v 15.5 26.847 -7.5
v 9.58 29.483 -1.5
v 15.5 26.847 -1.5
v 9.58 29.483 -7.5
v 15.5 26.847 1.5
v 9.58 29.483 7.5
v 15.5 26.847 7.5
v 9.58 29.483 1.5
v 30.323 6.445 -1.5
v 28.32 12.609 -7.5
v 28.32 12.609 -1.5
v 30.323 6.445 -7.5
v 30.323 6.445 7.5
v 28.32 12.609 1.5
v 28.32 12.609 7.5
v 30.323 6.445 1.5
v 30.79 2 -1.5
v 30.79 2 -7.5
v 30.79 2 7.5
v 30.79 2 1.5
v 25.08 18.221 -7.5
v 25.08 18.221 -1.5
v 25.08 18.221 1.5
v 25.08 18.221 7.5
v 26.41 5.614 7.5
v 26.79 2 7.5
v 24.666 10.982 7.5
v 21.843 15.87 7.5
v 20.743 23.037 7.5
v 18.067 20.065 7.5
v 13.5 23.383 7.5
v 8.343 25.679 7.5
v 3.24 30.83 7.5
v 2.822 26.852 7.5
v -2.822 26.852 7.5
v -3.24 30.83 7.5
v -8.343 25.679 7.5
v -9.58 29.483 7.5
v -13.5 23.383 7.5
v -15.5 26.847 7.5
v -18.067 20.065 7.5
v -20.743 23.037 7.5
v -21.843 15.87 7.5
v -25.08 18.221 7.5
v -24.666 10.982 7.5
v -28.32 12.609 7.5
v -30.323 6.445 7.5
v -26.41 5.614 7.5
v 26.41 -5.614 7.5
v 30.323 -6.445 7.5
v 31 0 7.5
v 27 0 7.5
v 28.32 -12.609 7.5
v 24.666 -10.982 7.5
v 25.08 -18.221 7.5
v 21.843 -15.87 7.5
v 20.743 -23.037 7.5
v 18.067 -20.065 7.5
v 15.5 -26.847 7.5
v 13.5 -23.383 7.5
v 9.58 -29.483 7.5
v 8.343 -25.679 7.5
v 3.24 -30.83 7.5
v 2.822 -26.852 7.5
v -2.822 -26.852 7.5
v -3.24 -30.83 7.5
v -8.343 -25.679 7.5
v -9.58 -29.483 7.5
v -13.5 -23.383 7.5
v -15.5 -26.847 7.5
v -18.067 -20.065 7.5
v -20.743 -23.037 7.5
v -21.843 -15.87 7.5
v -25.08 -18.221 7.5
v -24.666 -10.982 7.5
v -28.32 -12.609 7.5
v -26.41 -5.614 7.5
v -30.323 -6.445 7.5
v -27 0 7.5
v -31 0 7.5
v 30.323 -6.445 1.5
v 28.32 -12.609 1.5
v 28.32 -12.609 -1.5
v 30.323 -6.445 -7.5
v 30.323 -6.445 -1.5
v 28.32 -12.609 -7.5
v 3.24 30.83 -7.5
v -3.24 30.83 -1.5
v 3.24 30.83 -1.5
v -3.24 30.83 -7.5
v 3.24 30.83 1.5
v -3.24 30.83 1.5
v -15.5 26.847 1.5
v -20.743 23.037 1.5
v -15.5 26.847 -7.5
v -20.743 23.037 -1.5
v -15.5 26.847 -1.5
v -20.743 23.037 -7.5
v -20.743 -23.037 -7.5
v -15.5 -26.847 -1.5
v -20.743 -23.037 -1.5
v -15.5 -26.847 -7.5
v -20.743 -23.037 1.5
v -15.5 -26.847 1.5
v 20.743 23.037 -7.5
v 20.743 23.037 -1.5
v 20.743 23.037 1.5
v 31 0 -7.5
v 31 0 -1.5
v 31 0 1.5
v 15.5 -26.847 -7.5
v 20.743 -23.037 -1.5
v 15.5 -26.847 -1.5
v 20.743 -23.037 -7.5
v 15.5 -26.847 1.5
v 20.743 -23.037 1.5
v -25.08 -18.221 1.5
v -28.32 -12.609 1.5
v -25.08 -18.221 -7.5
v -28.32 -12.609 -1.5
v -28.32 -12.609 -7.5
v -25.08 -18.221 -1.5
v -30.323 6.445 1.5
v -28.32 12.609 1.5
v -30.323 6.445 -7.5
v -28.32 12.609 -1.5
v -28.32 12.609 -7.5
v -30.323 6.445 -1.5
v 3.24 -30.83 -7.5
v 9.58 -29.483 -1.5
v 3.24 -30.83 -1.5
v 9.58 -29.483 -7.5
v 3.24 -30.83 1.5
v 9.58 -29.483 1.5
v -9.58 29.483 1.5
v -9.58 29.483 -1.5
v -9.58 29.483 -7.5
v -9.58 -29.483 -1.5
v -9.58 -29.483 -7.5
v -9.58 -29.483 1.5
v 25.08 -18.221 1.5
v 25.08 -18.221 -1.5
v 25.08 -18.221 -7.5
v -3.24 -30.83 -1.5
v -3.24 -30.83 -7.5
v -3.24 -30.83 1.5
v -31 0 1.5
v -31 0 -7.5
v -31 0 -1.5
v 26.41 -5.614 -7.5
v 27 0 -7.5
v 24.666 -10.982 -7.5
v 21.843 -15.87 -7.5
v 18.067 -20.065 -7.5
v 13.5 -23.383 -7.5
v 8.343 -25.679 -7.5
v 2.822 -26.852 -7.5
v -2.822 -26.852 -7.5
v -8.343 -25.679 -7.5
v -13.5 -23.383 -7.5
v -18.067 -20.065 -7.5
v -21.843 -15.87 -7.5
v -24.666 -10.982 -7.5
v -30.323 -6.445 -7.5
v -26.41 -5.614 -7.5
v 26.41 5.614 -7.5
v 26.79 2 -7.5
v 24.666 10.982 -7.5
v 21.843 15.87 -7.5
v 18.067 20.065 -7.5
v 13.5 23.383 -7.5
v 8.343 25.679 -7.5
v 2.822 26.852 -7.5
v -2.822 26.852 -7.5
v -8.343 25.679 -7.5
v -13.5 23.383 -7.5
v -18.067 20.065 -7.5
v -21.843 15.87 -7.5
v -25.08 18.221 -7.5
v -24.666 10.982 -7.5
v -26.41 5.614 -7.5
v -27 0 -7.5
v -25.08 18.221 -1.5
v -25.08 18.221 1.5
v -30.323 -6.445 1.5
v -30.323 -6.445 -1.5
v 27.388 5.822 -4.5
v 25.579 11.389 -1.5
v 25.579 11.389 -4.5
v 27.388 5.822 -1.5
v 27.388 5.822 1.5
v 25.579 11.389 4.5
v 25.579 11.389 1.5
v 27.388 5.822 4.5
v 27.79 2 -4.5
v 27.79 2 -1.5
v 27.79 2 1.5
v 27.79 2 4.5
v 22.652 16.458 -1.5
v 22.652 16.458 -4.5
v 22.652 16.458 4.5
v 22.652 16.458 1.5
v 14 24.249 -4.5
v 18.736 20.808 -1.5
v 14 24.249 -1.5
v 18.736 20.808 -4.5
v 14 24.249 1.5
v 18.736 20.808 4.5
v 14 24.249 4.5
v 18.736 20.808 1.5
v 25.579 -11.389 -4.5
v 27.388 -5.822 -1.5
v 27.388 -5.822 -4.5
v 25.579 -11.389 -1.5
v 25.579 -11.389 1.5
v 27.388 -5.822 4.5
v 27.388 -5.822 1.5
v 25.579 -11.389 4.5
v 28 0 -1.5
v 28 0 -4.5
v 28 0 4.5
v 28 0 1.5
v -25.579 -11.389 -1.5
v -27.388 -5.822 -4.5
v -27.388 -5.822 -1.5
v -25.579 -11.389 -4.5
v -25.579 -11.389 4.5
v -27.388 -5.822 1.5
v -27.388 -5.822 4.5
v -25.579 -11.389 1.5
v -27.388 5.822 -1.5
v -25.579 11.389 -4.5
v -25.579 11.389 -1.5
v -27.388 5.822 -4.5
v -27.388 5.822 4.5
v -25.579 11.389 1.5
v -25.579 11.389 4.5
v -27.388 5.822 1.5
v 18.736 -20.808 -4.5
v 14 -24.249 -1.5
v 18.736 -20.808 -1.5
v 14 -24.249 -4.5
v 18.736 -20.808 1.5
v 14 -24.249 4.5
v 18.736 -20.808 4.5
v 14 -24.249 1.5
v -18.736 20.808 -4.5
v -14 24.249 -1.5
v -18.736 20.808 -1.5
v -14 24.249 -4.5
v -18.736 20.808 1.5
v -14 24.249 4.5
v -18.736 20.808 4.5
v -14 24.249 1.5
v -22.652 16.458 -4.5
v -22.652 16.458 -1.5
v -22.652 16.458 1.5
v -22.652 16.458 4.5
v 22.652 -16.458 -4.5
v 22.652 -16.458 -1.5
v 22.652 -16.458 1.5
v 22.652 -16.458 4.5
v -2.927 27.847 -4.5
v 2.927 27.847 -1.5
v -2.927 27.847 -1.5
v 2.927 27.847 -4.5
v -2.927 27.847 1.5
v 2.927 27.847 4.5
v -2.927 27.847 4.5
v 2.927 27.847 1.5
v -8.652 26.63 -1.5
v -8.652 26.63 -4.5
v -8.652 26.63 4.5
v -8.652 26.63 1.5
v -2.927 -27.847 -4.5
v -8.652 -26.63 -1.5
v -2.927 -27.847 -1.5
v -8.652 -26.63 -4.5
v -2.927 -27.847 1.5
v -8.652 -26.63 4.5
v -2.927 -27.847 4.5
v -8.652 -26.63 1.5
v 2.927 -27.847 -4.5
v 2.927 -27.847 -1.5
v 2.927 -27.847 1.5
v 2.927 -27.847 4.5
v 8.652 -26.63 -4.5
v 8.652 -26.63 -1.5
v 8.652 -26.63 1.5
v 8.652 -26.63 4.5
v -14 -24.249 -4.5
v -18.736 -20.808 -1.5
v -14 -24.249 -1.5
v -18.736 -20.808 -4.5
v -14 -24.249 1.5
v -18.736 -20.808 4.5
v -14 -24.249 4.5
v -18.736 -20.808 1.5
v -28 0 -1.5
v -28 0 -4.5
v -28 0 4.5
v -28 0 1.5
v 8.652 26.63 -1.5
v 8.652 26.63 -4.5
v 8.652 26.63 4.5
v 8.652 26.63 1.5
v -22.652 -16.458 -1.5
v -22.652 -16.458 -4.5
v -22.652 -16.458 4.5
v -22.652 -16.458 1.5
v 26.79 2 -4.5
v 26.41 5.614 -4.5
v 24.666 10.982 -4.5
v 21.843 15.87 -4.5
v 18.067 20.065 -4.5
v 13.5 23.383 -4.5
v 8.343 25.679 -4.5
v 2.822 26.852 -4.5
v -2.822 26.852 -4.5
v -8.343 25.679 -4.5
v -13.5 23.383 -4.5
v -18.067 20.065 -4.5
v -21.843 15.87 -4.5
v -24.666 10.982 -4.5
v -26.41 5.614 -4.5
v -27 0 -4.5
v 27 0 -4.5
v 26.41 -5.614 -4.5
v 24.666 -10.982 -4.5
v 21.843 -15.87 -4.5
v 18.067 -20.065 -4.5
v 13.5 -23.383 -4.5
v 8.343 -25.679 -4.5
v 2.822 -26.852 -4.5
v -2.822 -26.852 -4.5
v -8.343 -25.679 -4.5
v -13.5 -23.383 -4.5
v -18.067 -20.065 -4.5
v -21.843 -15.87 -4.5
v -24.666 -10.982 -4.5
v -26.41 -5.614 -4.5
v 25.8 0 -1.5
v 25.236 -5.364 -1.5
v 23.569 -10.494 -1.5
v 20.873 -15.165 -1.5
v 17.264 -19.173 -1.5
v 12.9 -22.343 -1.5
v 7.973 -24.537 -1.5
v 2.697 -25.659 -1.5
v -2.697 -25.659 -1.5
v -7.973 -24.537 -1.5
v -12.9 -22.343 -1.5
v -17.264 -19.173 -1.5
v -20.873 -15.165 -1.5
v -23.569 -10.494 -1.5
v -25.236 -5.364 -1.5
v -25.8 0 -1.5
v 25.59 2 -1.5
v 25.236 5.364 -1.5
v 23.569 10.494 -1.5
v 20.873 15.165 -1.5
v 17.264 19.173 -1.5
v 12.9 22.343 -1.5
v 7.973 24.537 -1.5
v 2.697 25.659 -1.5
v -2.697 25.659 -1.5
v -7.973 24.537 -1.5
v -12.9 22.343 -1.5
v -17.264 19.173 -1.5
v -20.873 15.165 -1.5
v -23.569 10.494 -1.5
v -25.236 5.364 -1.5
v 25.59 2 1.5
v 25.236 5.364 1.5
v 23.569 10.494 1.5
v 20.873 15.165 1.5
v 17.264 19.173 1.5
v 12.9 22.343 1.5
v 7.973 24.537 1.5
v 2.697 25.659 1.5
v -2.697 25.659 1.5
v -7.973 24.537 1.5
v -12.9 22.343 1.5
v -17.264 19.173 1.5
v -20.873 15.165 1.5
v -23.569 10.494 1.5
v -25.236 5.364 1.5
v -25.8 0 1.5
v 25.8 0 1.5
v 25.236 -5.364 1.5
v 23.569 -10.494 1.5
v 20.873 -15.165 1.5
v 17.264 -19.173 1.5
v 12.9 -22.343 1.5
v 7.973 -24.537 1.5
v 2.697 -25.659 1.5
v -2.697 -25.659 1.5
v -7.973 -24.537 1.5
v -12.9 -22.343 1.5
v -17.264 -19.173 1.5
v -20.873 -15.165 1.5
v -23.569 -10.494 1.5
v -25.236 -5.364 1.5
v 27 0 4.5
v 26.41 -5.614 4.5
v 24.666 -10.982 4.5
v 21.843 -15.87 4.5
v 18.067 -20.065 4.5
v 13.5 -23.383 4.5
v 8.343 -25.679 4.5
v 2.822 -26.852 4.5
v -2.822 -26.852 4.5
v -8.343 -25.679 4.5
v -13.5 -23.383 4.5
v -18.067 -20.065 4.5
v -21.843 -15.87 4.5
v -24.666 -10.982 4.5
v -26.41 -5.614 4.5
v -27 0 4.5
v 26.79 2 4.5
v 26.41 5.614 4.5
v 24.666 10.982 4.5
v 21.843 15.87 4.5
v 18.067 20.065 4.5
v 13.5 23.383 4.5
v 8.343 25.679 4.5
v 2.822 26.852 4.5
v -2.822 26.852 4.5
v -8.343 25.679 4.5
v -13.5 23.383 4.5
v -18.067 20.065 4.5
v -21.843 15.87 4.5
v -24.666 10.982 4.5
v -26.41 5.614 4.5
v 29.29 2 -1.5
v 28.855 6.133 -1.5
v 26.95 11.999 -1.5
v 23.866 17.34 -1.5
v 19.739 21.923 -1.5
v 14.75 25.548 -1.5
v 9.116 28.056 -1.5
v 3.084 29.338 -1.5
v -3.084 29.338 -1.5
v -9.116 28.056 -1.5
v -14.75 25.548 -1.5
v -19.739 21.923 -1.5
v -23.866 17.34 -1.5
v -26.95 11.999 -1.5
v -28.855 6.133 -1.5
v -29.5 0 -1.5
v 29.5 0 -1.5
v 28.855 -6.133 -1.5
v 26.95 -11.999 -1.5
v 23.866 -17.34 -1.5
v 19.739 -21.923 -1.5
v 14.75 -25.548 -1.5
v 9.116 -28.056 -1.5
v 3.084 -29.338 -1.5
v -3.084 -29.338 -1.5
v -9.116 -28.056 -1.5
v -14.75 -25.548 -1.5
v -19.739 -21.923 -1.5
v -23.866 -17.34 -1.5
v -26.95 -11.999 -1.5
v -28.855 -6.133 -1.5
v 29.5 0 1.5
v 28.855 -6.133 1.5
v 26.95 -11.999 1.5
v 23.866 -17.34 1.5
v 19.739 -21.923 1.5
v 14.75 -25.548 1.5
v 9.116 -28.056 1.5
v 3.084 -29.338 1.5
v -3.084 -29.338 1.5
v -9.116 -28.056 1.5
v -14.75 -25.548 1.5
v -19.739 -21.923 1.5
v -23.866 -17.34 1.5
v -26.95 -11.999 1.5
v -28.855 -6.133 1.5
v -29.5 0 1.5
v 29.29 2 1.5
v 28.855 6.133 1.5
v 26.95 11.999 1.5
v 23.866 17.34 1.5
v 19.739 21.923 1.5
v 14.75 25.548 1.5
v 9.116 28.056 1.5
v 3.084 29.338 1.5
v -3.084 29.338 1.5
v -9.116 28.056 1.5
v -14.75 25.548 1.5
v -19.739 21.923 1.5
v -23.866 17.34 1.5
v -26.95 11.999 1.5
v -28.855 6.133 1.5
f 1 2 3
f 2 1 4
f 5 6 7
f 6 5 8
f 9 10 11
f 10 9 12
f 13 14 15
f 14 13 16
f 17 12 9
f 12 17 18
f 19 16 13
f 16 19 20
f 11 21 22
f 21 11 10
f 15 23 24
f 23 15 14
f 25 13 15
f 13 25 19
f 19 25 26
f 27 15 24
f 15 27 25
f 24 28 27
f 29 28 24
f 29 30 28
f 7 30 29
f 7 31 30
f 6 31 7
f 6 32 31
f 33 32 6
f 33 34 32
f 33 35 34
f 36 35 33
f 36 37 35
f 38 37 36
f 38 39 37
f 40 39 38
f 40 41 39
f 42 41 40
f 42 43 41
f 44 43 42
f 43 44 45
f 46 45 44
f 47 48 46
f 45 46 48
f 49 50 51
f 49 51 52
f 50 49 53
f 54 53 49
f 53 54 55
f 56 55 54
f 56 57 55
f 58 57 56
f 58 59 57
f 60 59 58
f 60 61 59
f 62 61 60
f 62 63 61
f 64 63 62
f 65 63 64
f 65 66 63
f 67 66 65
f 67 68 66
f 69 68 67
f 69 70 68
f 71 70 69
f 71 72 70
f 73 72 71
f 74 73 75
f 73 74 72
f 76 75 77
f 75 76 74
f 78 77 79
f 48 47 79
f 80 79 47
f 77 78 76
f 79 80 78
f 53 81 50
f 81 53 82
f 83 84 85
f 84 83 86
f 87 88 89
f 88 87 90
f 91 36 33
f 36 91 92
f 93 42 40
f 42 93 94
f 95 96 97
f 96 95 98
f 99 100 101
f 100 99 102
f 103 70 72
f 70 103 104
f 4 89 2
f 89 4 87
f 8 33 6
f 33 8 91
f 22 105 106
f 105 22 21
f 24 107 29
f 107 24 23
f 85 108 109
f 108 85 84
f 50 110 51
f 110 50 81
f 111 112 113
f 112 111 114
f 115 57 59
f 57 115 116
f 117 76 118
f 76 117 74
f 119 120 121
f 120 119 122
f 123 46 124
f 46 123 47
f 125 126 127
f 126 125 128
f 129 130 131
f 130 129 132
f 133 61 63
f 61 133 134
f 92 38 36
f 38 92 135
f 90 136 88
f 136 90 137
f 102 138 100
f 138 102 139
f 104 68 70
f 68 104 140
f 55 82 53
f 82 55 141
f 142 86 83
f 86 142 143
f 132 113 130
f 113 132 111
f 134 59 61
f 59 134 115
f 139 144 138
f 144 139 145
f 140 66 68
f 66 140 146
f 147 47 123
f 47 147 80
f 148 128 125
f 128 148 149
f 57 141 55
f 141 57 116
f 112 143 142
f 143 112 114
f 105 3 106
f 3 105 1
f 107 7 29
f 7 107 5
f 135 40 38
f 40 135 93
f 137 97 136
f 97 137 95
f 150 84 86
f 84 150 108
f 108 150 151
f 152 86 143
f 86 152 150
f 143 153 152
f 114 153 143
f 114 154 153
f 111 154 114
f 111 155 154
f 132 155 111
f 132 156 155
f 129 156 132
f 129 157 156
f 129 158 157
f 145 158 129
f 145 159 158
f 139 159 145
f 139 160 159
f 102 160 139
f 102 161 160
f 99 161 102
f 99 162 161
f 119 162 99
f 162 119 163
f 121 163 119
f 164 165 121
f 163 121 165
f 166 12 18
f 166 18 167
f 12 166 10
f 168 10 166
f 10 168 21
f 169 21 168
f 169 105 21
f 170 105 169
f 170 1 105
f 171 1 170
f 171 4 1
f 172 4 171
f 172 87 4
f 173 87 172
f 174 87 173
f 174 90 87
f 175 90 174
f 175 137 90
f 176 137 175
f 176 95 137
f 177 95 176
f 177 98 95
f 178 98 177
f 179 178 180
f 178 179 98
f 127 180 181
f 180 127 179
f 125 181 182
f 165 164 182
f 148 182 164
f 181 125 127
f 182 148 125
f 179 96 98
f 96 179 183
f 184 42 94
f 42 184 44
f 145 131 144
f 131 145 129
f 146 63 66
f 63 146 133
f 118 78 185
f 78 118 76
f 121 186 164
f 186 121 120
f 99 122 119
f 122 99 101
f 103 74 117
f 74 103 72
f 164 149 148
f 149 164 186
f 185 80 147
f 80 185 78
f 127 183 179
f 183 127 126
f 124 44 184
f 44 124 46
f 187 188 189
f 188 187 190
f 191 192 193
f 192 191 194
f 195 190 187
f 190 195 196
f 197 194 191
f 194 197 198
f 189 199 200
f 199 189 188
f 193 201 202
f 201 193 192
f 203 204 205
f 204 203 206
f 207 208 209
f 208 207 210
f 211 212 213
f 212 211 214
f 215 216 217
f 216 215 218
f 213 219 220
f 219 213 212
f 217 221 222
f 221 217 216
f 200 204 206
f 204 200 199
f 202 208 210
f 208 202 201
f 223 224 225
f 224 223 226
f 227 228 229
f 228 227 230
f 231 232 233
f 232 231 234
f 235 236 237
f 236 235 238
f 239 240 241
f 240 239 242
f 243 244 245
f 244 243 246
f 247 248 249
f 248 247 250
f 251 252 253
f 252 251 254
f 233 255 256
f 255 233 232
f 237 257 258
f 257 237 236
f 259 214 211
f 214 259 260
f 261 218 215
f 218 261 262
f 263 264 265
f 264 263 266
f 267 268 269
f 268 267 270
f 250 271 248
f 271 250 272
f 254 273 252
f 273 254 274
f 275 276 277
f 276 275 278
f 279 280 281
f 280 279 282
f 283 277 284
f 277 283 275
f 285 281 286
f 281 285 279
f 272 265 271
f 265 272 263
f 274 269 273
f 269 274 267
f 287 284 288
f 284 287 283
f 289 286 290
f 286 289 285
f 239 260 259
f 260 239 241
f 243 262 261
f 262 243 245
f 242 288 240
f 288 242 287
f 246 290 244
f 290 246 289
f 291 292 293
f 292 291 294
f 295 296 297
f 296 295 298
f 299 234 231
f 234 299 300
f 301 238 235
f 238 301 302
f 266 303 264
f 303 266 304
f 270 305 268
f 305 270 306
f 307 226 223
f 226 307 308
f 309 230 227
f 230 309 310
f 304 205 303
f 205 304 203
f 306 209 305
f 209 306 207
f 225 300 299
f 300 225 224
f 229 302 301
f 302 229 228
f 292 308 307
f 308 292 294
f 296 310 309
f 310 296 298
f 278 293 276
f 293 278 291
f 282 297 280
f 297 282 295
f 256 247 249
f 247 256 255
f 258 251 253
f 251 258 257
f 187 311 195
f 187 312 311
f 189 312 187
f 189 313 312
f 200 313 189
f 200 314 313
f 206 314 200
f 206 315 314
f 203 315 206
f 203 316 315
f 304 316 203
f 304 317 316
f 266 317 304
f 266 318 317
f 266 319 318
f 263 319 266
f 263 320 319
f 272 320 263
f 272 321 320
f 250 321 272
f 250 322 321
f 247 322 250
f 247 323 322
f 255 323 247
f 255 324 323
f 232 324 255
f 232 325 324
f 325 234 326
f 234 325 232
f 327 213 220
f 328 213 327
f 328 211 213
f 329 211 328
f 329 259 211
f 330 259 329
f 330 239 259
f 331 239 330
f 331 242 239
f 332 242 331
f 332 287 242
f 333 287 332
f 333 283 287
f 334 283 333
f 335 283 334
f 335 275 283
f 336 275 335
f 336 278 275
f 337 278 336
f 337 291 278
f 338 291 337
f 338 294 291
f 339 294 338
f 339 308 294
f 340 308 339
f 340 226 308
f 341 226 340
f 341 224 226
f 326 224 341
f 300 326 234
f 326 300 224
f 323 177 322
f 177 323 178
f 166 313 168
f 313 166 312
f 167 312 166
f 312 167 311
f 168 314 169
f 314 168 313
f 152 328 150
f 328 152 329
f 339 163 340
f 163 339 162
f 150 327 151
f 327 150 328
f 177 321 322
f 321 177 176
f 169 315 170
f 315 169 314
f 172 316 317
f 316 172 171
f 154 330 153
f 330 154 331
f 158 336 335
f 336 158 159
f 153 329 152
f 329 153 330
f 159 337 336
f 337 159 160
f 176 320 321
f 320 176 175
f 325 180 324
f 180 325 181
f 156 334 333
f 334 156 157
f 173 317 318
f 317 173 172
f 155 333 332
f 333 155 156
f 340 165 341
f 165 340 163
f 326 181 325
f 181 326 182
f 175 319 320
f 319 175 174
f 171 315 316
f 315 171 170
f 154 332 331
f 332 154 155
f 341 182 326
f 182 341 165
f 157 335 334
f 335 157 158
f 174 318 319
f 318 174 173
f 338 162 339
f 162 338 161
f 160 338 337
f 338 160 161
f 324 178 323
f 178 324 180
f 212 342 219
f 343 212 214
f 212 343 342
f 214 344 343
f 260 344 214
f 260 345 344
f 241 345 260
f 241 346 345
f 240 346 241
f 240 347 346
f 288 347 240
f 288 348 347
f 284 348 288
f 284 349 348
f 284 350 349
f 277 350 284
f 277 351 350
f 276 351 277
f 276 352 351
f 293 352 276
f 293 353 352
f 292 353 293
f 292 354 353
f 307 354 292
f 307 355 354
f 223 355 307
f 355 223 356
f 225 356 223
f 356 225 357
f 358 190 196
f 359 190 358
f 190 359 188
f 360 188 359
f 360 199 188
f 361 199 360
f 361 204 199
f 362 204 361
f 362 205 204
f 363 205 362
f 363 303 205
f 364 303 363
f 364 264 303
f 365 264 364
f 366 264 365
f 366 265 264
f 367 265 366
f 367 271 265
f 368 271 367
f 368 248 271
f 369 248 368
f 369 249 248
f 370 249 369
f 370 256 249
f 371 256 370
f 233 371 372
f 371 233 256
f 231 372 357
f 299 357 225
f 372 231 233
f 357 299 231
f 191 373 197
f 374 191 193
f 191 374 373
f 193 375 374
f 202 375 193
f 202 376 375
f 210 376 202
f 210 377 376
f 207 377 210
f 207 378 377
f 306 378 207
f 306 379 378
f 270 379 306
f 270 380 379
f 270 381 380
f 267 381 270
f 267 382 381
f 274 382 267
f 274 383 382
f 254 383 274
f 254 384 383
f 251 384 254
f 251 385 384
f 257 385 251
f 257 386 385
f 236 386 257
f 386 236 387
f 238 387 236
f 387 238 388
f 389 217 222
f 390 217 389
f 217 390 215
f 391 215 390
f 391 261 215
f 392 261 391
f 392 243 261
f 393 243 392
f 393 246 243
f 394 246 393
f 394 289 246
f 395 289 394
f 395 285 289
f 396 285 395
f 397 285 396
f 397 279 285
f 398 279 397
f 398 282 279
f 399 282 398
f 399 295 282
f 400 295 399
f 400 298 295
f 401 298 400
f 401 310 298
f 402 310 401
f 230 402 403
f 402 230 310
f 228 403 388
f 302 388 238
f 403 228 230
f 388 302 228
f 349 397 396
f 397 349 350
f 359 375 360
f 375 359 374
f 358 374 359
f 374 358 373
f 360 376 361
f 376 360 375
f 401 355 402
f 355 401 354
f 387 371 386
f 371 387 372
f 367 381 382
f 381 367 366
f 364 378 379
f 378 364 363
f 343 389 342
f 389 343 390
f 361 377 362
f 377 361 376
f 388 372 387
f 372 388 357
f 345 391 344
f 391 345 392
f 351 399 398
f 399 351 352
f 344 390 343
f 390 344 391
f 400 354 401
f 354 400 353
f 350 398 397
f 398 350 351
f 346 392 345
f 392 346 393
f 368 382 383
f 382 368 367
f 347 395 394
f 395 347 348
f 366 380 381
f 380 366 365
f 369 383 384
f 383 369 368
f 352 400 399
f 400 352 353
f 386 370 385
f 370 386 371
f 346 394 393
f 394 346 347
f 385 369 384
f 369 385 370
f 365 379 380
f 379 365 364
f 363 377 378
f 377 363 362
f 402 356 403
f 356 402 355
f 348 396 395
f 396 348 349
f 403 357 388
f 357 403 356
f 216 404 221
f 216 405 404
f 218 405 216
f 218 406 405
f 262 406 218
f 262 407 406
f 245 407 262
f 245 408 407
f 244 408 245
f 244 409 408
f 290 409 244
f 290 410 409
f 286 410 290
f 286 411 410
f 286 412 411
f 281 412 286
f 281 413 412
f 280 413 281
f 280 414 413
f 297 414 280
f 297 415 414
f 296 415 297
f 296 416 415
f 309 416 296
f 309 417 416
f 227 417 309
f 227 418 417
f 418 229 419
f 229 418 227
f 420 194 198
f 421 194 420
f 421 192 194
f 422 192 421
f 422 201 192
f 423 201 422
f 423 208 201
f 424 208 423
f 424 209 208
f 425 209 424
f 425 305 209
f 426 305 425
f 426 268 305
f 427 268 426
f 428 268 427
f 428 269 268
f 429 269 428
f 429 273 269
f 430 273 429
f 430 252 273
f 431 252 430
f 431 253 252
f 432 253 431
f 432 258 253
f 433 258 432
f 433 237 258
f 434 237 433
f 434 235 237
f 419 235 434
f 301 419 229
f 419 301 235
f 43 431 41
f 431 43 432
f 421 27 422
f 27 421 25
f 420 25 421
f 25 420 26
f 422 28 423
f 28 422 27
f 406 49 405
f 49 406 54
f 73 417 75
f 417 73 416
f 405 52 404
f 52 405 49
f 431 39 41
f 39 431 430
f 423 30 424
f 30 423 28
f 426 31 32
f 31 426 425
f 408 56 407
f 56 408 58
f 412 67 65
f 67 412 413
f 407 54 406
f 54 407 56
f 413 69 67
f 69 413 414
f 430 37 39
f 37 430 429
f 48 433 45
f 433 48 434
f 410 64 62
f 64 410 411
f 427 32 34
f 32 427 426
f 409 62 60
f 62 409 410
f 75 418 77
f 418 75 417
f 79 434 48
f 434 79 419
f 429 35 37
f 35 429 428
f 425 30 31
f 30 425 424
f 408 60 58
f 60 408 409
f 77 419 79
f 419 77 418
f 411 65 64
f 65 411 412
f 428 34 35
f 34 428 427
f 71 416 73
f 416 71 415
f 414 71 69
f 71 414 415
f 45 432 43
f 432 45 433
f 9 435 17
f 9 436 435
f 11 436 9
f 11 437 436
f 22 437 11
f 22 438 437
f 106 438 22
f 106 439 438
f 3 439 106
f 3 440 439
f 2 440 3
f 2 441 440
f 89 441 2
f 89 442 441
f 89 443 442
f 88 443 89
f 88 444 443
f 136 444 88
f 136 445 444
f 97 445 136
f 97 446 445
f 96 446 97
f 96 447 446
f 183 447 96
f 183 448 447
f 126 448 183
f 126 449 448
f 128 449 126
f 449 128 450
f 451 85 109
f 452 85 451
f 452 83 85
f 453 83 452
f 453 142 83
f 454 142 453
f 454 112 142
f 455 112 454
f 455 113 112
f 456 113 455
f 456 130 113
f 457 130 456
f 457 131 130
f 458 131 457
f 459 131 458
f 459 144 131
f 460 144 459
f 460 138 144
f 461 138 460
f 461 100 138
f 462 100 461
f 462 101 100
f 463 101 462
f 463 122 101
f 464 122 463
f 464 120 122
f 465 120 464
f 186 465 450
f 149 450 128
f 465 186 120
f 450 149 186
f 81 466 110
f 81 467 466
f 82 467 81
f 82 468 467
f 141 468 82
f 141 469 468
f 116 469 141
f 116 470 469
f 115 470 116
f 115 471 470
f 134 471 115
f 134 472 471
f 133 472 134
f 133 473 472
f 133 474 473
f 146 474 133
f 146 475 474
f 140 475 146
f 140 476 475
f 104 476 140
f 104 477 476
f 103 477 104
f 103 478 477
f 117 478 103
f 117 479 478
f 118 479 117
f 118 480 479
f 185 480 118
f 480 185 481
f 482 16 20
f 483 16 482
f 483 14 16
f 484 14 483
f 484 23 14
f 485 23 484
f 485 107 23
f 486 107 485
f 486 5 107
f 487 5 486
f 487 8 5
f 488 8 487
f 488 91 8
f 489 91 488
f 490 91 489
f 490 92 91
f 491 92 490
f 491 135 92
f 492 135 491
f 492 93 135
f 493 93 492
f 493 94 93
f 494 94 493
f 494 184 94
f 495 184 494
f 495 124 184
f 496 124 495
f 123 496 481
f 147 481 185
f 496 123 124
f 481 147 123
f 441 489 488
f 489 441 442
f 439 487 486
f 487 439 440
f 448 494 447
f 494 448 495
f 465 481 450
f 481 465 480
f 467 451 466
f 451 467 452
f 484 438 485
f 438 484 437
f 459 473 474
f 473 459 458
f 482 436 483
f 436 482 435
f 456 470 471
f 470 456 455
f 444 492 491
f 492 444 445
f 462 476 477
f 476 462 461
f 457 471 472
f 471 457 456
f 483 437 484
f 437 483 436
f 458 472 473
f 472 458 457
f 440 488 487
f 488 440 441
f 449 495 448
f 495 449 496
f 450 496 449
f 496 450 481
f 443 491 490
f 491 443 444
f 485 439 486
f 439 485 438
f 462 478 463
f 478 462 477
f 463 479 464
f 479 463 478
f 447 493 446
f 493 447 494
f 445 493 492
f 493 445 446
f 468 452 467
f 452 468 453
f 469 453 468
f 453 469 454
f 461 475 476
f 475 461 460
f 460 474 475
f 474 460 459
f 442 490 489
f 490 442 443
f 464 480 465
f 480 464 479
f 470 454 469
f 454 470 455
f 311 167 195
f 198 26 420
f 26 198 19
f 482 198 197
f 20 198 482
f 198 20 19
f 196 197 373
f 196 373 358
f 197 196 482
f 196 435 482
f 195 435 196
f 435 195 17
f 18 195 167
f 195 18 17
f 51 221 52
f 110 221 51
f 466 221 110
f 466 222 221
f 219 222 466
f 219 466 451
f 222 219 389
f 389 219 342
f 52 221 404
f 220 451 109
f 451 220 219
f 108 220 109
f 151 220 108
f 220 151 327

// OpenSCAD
main_diameter = 54;
tube_thickness = 1.2;
tube_length = 97;

ladder_rungs_thickess = 2;
ladder_rungs_count = 4;
vent_hole_diameter = 3;
vent_holes_per_ring = 3;


fit_diameter1 = 56;
fit_l1 = 3;
fit_l2 = 3;
fit_diameter3 = 60;
fit_l3 = 3;

connector_d=62;
connector_delta_d=59;
connector_delta=3;
connector_cut_th=2;

eps = 0.01;

home_diameter_1 = 110;
home_diameter_2 = 65;


module tube(do, di, th, l) {
    let(ddi=(di == undef) ? (do - th*2) : di){
        difference() {
            cylinder(h=l, d=do);
            translate([0, 0, -eps]) {
                cylinder(h=l + eps*2, d=ddi);
            };
        };
    };

}


module ladder_rung() {
    rotate_extrude(angle = 360, convexity = 200) {
        translate([
            -main_diameter/2 + ladder_rungs_thickess - (0.5 * eps * cos(30)), 0, 0]) {
            //rotate(a=90, [1, 0, 0]){
                circle(d=ladder_rungs_thickess+eps, $fn=3);
            //}
        }
    }
};

module fitting() {
    tube(do=fit_diameter1, di=main_diameter-eps, l=fit_l1);
    translate([0,0,fit_l1 + fit_l2]) {
        tube(do=fit_diameter3, di=main_diameter-eps, l=fit_l3);
    }
};

module hamster_tube() {
    difference() {
        tube(do=main_diameter, th=tube_thickness, l=tube_length, $fn=200);
        let (step_size = tube_length / (ladder_rungs_count)) {
            for(j=[0: vent_holes_per_ring]) {
                rotate(360/vent_holes_per_ring*j, [0,0,1]) {
                    for (i = [0:(ladder_rungs_count-1)]) {
                        let(z = step_size * i) {
                            echo("z: ", z);
                            translate([0,0,z]) {
                                rotate(90, [0,1,0]) {
                                    cylinder(d=vent_hole_diameter, h=main_diameter/2+eps);
                                }
                            }
                            
                        }
                    }
                }
            }
        }
    };

    let (step_size = tube_length / (ladder_rungs_count)) {
        echo("Delta: ", step_size);
        for (i = [0:(ladder_rungs_count-1)]) {
            let(z = step_size * i + step_size*0.5) {
                echo("z: ", z);
                translate([0, 0, z]) {
                    ladder_rung();
                }
            }
        }
    };
    
    fitting();
    
    translate([0,0,tube_length]) {
        mirror([0,0,1]) {
            fitting();
        }
    }
};

module hamster_home() {
    difference() {
        union() {
            scale([1,1,home_diameter_2/home_diameter_1]) {
                sphere(d=home_diameter_1, $fn=100);
            };
            
            for(i=[0,1]) {
                rotate(90*i, [0,0,1]) {
                    rotate(90, [0,1,0]) {
                        cylinder(d=main_diameter, h=home_diameter_1/2, $fn=100);
                        translate([0,0, home_diameter_1/2]) {
                            mirror([0,0,1]) {
                                fitting($fn=200);
                            }
                        }
                    };
                };
            }
        };
        union() {
            scale([1,1,(home_diameter_2-tube_thickness*2)/(home_diameter_1-tube_thickness*2)]) {
                sphere(d=home_diameter_1-tube_thickness*2, $fn=100);
            };
            
            for(i=[0,1]) {
                rotate(90*i, [0,0,1]) {
                    rotate(90, [0,1,0]) {
                        cylinder(d=main_diameter-tube_thickness*2, h=home_diameter_1/2+eps, $fn=200);
             
                    };
                };
            }

        }
        
        
    }
}

*hamster_tube();
*hamster_home();

let(connector_l=fit_l1*2 + fit_l2*2 + connector_delta) {
    difference() {
        union() {
        
            translate([0,0,-connector_l*0.5]) {
                tube(do=connector_d, di=fit_diameter1, l=connector_l);
                //mirror([0,0,1]) 
                tube(do=fit_diameter1+eps, di=main_diameter, l=fit_l1);
                
                translate([0,0,fit_l1+fit_l2]) {
                    tube(do=fit_diameter1+eps, di=main_diameter-tube_thickness*2, l=fit_l3);
                }
                
                translate([0,0,connector_l]) {
                    mirror([0,0,1]) {
                        tube(do=fit_diameter1+eps, di=main_diameter, l=fit_l1);
                    }
                }
            }
        };
    
        translate([0,0,-fit_l2*0.5]) {
            tube(do=connector_d+eps, di=connector_delta_d, l=fit_l2);
        };
        
        translate([0,0,-connector_l*0.5-eps]) {
            cube([connector_d+eps, connector_cut_th, connector_l+eps*2]);
        };
    }
}
